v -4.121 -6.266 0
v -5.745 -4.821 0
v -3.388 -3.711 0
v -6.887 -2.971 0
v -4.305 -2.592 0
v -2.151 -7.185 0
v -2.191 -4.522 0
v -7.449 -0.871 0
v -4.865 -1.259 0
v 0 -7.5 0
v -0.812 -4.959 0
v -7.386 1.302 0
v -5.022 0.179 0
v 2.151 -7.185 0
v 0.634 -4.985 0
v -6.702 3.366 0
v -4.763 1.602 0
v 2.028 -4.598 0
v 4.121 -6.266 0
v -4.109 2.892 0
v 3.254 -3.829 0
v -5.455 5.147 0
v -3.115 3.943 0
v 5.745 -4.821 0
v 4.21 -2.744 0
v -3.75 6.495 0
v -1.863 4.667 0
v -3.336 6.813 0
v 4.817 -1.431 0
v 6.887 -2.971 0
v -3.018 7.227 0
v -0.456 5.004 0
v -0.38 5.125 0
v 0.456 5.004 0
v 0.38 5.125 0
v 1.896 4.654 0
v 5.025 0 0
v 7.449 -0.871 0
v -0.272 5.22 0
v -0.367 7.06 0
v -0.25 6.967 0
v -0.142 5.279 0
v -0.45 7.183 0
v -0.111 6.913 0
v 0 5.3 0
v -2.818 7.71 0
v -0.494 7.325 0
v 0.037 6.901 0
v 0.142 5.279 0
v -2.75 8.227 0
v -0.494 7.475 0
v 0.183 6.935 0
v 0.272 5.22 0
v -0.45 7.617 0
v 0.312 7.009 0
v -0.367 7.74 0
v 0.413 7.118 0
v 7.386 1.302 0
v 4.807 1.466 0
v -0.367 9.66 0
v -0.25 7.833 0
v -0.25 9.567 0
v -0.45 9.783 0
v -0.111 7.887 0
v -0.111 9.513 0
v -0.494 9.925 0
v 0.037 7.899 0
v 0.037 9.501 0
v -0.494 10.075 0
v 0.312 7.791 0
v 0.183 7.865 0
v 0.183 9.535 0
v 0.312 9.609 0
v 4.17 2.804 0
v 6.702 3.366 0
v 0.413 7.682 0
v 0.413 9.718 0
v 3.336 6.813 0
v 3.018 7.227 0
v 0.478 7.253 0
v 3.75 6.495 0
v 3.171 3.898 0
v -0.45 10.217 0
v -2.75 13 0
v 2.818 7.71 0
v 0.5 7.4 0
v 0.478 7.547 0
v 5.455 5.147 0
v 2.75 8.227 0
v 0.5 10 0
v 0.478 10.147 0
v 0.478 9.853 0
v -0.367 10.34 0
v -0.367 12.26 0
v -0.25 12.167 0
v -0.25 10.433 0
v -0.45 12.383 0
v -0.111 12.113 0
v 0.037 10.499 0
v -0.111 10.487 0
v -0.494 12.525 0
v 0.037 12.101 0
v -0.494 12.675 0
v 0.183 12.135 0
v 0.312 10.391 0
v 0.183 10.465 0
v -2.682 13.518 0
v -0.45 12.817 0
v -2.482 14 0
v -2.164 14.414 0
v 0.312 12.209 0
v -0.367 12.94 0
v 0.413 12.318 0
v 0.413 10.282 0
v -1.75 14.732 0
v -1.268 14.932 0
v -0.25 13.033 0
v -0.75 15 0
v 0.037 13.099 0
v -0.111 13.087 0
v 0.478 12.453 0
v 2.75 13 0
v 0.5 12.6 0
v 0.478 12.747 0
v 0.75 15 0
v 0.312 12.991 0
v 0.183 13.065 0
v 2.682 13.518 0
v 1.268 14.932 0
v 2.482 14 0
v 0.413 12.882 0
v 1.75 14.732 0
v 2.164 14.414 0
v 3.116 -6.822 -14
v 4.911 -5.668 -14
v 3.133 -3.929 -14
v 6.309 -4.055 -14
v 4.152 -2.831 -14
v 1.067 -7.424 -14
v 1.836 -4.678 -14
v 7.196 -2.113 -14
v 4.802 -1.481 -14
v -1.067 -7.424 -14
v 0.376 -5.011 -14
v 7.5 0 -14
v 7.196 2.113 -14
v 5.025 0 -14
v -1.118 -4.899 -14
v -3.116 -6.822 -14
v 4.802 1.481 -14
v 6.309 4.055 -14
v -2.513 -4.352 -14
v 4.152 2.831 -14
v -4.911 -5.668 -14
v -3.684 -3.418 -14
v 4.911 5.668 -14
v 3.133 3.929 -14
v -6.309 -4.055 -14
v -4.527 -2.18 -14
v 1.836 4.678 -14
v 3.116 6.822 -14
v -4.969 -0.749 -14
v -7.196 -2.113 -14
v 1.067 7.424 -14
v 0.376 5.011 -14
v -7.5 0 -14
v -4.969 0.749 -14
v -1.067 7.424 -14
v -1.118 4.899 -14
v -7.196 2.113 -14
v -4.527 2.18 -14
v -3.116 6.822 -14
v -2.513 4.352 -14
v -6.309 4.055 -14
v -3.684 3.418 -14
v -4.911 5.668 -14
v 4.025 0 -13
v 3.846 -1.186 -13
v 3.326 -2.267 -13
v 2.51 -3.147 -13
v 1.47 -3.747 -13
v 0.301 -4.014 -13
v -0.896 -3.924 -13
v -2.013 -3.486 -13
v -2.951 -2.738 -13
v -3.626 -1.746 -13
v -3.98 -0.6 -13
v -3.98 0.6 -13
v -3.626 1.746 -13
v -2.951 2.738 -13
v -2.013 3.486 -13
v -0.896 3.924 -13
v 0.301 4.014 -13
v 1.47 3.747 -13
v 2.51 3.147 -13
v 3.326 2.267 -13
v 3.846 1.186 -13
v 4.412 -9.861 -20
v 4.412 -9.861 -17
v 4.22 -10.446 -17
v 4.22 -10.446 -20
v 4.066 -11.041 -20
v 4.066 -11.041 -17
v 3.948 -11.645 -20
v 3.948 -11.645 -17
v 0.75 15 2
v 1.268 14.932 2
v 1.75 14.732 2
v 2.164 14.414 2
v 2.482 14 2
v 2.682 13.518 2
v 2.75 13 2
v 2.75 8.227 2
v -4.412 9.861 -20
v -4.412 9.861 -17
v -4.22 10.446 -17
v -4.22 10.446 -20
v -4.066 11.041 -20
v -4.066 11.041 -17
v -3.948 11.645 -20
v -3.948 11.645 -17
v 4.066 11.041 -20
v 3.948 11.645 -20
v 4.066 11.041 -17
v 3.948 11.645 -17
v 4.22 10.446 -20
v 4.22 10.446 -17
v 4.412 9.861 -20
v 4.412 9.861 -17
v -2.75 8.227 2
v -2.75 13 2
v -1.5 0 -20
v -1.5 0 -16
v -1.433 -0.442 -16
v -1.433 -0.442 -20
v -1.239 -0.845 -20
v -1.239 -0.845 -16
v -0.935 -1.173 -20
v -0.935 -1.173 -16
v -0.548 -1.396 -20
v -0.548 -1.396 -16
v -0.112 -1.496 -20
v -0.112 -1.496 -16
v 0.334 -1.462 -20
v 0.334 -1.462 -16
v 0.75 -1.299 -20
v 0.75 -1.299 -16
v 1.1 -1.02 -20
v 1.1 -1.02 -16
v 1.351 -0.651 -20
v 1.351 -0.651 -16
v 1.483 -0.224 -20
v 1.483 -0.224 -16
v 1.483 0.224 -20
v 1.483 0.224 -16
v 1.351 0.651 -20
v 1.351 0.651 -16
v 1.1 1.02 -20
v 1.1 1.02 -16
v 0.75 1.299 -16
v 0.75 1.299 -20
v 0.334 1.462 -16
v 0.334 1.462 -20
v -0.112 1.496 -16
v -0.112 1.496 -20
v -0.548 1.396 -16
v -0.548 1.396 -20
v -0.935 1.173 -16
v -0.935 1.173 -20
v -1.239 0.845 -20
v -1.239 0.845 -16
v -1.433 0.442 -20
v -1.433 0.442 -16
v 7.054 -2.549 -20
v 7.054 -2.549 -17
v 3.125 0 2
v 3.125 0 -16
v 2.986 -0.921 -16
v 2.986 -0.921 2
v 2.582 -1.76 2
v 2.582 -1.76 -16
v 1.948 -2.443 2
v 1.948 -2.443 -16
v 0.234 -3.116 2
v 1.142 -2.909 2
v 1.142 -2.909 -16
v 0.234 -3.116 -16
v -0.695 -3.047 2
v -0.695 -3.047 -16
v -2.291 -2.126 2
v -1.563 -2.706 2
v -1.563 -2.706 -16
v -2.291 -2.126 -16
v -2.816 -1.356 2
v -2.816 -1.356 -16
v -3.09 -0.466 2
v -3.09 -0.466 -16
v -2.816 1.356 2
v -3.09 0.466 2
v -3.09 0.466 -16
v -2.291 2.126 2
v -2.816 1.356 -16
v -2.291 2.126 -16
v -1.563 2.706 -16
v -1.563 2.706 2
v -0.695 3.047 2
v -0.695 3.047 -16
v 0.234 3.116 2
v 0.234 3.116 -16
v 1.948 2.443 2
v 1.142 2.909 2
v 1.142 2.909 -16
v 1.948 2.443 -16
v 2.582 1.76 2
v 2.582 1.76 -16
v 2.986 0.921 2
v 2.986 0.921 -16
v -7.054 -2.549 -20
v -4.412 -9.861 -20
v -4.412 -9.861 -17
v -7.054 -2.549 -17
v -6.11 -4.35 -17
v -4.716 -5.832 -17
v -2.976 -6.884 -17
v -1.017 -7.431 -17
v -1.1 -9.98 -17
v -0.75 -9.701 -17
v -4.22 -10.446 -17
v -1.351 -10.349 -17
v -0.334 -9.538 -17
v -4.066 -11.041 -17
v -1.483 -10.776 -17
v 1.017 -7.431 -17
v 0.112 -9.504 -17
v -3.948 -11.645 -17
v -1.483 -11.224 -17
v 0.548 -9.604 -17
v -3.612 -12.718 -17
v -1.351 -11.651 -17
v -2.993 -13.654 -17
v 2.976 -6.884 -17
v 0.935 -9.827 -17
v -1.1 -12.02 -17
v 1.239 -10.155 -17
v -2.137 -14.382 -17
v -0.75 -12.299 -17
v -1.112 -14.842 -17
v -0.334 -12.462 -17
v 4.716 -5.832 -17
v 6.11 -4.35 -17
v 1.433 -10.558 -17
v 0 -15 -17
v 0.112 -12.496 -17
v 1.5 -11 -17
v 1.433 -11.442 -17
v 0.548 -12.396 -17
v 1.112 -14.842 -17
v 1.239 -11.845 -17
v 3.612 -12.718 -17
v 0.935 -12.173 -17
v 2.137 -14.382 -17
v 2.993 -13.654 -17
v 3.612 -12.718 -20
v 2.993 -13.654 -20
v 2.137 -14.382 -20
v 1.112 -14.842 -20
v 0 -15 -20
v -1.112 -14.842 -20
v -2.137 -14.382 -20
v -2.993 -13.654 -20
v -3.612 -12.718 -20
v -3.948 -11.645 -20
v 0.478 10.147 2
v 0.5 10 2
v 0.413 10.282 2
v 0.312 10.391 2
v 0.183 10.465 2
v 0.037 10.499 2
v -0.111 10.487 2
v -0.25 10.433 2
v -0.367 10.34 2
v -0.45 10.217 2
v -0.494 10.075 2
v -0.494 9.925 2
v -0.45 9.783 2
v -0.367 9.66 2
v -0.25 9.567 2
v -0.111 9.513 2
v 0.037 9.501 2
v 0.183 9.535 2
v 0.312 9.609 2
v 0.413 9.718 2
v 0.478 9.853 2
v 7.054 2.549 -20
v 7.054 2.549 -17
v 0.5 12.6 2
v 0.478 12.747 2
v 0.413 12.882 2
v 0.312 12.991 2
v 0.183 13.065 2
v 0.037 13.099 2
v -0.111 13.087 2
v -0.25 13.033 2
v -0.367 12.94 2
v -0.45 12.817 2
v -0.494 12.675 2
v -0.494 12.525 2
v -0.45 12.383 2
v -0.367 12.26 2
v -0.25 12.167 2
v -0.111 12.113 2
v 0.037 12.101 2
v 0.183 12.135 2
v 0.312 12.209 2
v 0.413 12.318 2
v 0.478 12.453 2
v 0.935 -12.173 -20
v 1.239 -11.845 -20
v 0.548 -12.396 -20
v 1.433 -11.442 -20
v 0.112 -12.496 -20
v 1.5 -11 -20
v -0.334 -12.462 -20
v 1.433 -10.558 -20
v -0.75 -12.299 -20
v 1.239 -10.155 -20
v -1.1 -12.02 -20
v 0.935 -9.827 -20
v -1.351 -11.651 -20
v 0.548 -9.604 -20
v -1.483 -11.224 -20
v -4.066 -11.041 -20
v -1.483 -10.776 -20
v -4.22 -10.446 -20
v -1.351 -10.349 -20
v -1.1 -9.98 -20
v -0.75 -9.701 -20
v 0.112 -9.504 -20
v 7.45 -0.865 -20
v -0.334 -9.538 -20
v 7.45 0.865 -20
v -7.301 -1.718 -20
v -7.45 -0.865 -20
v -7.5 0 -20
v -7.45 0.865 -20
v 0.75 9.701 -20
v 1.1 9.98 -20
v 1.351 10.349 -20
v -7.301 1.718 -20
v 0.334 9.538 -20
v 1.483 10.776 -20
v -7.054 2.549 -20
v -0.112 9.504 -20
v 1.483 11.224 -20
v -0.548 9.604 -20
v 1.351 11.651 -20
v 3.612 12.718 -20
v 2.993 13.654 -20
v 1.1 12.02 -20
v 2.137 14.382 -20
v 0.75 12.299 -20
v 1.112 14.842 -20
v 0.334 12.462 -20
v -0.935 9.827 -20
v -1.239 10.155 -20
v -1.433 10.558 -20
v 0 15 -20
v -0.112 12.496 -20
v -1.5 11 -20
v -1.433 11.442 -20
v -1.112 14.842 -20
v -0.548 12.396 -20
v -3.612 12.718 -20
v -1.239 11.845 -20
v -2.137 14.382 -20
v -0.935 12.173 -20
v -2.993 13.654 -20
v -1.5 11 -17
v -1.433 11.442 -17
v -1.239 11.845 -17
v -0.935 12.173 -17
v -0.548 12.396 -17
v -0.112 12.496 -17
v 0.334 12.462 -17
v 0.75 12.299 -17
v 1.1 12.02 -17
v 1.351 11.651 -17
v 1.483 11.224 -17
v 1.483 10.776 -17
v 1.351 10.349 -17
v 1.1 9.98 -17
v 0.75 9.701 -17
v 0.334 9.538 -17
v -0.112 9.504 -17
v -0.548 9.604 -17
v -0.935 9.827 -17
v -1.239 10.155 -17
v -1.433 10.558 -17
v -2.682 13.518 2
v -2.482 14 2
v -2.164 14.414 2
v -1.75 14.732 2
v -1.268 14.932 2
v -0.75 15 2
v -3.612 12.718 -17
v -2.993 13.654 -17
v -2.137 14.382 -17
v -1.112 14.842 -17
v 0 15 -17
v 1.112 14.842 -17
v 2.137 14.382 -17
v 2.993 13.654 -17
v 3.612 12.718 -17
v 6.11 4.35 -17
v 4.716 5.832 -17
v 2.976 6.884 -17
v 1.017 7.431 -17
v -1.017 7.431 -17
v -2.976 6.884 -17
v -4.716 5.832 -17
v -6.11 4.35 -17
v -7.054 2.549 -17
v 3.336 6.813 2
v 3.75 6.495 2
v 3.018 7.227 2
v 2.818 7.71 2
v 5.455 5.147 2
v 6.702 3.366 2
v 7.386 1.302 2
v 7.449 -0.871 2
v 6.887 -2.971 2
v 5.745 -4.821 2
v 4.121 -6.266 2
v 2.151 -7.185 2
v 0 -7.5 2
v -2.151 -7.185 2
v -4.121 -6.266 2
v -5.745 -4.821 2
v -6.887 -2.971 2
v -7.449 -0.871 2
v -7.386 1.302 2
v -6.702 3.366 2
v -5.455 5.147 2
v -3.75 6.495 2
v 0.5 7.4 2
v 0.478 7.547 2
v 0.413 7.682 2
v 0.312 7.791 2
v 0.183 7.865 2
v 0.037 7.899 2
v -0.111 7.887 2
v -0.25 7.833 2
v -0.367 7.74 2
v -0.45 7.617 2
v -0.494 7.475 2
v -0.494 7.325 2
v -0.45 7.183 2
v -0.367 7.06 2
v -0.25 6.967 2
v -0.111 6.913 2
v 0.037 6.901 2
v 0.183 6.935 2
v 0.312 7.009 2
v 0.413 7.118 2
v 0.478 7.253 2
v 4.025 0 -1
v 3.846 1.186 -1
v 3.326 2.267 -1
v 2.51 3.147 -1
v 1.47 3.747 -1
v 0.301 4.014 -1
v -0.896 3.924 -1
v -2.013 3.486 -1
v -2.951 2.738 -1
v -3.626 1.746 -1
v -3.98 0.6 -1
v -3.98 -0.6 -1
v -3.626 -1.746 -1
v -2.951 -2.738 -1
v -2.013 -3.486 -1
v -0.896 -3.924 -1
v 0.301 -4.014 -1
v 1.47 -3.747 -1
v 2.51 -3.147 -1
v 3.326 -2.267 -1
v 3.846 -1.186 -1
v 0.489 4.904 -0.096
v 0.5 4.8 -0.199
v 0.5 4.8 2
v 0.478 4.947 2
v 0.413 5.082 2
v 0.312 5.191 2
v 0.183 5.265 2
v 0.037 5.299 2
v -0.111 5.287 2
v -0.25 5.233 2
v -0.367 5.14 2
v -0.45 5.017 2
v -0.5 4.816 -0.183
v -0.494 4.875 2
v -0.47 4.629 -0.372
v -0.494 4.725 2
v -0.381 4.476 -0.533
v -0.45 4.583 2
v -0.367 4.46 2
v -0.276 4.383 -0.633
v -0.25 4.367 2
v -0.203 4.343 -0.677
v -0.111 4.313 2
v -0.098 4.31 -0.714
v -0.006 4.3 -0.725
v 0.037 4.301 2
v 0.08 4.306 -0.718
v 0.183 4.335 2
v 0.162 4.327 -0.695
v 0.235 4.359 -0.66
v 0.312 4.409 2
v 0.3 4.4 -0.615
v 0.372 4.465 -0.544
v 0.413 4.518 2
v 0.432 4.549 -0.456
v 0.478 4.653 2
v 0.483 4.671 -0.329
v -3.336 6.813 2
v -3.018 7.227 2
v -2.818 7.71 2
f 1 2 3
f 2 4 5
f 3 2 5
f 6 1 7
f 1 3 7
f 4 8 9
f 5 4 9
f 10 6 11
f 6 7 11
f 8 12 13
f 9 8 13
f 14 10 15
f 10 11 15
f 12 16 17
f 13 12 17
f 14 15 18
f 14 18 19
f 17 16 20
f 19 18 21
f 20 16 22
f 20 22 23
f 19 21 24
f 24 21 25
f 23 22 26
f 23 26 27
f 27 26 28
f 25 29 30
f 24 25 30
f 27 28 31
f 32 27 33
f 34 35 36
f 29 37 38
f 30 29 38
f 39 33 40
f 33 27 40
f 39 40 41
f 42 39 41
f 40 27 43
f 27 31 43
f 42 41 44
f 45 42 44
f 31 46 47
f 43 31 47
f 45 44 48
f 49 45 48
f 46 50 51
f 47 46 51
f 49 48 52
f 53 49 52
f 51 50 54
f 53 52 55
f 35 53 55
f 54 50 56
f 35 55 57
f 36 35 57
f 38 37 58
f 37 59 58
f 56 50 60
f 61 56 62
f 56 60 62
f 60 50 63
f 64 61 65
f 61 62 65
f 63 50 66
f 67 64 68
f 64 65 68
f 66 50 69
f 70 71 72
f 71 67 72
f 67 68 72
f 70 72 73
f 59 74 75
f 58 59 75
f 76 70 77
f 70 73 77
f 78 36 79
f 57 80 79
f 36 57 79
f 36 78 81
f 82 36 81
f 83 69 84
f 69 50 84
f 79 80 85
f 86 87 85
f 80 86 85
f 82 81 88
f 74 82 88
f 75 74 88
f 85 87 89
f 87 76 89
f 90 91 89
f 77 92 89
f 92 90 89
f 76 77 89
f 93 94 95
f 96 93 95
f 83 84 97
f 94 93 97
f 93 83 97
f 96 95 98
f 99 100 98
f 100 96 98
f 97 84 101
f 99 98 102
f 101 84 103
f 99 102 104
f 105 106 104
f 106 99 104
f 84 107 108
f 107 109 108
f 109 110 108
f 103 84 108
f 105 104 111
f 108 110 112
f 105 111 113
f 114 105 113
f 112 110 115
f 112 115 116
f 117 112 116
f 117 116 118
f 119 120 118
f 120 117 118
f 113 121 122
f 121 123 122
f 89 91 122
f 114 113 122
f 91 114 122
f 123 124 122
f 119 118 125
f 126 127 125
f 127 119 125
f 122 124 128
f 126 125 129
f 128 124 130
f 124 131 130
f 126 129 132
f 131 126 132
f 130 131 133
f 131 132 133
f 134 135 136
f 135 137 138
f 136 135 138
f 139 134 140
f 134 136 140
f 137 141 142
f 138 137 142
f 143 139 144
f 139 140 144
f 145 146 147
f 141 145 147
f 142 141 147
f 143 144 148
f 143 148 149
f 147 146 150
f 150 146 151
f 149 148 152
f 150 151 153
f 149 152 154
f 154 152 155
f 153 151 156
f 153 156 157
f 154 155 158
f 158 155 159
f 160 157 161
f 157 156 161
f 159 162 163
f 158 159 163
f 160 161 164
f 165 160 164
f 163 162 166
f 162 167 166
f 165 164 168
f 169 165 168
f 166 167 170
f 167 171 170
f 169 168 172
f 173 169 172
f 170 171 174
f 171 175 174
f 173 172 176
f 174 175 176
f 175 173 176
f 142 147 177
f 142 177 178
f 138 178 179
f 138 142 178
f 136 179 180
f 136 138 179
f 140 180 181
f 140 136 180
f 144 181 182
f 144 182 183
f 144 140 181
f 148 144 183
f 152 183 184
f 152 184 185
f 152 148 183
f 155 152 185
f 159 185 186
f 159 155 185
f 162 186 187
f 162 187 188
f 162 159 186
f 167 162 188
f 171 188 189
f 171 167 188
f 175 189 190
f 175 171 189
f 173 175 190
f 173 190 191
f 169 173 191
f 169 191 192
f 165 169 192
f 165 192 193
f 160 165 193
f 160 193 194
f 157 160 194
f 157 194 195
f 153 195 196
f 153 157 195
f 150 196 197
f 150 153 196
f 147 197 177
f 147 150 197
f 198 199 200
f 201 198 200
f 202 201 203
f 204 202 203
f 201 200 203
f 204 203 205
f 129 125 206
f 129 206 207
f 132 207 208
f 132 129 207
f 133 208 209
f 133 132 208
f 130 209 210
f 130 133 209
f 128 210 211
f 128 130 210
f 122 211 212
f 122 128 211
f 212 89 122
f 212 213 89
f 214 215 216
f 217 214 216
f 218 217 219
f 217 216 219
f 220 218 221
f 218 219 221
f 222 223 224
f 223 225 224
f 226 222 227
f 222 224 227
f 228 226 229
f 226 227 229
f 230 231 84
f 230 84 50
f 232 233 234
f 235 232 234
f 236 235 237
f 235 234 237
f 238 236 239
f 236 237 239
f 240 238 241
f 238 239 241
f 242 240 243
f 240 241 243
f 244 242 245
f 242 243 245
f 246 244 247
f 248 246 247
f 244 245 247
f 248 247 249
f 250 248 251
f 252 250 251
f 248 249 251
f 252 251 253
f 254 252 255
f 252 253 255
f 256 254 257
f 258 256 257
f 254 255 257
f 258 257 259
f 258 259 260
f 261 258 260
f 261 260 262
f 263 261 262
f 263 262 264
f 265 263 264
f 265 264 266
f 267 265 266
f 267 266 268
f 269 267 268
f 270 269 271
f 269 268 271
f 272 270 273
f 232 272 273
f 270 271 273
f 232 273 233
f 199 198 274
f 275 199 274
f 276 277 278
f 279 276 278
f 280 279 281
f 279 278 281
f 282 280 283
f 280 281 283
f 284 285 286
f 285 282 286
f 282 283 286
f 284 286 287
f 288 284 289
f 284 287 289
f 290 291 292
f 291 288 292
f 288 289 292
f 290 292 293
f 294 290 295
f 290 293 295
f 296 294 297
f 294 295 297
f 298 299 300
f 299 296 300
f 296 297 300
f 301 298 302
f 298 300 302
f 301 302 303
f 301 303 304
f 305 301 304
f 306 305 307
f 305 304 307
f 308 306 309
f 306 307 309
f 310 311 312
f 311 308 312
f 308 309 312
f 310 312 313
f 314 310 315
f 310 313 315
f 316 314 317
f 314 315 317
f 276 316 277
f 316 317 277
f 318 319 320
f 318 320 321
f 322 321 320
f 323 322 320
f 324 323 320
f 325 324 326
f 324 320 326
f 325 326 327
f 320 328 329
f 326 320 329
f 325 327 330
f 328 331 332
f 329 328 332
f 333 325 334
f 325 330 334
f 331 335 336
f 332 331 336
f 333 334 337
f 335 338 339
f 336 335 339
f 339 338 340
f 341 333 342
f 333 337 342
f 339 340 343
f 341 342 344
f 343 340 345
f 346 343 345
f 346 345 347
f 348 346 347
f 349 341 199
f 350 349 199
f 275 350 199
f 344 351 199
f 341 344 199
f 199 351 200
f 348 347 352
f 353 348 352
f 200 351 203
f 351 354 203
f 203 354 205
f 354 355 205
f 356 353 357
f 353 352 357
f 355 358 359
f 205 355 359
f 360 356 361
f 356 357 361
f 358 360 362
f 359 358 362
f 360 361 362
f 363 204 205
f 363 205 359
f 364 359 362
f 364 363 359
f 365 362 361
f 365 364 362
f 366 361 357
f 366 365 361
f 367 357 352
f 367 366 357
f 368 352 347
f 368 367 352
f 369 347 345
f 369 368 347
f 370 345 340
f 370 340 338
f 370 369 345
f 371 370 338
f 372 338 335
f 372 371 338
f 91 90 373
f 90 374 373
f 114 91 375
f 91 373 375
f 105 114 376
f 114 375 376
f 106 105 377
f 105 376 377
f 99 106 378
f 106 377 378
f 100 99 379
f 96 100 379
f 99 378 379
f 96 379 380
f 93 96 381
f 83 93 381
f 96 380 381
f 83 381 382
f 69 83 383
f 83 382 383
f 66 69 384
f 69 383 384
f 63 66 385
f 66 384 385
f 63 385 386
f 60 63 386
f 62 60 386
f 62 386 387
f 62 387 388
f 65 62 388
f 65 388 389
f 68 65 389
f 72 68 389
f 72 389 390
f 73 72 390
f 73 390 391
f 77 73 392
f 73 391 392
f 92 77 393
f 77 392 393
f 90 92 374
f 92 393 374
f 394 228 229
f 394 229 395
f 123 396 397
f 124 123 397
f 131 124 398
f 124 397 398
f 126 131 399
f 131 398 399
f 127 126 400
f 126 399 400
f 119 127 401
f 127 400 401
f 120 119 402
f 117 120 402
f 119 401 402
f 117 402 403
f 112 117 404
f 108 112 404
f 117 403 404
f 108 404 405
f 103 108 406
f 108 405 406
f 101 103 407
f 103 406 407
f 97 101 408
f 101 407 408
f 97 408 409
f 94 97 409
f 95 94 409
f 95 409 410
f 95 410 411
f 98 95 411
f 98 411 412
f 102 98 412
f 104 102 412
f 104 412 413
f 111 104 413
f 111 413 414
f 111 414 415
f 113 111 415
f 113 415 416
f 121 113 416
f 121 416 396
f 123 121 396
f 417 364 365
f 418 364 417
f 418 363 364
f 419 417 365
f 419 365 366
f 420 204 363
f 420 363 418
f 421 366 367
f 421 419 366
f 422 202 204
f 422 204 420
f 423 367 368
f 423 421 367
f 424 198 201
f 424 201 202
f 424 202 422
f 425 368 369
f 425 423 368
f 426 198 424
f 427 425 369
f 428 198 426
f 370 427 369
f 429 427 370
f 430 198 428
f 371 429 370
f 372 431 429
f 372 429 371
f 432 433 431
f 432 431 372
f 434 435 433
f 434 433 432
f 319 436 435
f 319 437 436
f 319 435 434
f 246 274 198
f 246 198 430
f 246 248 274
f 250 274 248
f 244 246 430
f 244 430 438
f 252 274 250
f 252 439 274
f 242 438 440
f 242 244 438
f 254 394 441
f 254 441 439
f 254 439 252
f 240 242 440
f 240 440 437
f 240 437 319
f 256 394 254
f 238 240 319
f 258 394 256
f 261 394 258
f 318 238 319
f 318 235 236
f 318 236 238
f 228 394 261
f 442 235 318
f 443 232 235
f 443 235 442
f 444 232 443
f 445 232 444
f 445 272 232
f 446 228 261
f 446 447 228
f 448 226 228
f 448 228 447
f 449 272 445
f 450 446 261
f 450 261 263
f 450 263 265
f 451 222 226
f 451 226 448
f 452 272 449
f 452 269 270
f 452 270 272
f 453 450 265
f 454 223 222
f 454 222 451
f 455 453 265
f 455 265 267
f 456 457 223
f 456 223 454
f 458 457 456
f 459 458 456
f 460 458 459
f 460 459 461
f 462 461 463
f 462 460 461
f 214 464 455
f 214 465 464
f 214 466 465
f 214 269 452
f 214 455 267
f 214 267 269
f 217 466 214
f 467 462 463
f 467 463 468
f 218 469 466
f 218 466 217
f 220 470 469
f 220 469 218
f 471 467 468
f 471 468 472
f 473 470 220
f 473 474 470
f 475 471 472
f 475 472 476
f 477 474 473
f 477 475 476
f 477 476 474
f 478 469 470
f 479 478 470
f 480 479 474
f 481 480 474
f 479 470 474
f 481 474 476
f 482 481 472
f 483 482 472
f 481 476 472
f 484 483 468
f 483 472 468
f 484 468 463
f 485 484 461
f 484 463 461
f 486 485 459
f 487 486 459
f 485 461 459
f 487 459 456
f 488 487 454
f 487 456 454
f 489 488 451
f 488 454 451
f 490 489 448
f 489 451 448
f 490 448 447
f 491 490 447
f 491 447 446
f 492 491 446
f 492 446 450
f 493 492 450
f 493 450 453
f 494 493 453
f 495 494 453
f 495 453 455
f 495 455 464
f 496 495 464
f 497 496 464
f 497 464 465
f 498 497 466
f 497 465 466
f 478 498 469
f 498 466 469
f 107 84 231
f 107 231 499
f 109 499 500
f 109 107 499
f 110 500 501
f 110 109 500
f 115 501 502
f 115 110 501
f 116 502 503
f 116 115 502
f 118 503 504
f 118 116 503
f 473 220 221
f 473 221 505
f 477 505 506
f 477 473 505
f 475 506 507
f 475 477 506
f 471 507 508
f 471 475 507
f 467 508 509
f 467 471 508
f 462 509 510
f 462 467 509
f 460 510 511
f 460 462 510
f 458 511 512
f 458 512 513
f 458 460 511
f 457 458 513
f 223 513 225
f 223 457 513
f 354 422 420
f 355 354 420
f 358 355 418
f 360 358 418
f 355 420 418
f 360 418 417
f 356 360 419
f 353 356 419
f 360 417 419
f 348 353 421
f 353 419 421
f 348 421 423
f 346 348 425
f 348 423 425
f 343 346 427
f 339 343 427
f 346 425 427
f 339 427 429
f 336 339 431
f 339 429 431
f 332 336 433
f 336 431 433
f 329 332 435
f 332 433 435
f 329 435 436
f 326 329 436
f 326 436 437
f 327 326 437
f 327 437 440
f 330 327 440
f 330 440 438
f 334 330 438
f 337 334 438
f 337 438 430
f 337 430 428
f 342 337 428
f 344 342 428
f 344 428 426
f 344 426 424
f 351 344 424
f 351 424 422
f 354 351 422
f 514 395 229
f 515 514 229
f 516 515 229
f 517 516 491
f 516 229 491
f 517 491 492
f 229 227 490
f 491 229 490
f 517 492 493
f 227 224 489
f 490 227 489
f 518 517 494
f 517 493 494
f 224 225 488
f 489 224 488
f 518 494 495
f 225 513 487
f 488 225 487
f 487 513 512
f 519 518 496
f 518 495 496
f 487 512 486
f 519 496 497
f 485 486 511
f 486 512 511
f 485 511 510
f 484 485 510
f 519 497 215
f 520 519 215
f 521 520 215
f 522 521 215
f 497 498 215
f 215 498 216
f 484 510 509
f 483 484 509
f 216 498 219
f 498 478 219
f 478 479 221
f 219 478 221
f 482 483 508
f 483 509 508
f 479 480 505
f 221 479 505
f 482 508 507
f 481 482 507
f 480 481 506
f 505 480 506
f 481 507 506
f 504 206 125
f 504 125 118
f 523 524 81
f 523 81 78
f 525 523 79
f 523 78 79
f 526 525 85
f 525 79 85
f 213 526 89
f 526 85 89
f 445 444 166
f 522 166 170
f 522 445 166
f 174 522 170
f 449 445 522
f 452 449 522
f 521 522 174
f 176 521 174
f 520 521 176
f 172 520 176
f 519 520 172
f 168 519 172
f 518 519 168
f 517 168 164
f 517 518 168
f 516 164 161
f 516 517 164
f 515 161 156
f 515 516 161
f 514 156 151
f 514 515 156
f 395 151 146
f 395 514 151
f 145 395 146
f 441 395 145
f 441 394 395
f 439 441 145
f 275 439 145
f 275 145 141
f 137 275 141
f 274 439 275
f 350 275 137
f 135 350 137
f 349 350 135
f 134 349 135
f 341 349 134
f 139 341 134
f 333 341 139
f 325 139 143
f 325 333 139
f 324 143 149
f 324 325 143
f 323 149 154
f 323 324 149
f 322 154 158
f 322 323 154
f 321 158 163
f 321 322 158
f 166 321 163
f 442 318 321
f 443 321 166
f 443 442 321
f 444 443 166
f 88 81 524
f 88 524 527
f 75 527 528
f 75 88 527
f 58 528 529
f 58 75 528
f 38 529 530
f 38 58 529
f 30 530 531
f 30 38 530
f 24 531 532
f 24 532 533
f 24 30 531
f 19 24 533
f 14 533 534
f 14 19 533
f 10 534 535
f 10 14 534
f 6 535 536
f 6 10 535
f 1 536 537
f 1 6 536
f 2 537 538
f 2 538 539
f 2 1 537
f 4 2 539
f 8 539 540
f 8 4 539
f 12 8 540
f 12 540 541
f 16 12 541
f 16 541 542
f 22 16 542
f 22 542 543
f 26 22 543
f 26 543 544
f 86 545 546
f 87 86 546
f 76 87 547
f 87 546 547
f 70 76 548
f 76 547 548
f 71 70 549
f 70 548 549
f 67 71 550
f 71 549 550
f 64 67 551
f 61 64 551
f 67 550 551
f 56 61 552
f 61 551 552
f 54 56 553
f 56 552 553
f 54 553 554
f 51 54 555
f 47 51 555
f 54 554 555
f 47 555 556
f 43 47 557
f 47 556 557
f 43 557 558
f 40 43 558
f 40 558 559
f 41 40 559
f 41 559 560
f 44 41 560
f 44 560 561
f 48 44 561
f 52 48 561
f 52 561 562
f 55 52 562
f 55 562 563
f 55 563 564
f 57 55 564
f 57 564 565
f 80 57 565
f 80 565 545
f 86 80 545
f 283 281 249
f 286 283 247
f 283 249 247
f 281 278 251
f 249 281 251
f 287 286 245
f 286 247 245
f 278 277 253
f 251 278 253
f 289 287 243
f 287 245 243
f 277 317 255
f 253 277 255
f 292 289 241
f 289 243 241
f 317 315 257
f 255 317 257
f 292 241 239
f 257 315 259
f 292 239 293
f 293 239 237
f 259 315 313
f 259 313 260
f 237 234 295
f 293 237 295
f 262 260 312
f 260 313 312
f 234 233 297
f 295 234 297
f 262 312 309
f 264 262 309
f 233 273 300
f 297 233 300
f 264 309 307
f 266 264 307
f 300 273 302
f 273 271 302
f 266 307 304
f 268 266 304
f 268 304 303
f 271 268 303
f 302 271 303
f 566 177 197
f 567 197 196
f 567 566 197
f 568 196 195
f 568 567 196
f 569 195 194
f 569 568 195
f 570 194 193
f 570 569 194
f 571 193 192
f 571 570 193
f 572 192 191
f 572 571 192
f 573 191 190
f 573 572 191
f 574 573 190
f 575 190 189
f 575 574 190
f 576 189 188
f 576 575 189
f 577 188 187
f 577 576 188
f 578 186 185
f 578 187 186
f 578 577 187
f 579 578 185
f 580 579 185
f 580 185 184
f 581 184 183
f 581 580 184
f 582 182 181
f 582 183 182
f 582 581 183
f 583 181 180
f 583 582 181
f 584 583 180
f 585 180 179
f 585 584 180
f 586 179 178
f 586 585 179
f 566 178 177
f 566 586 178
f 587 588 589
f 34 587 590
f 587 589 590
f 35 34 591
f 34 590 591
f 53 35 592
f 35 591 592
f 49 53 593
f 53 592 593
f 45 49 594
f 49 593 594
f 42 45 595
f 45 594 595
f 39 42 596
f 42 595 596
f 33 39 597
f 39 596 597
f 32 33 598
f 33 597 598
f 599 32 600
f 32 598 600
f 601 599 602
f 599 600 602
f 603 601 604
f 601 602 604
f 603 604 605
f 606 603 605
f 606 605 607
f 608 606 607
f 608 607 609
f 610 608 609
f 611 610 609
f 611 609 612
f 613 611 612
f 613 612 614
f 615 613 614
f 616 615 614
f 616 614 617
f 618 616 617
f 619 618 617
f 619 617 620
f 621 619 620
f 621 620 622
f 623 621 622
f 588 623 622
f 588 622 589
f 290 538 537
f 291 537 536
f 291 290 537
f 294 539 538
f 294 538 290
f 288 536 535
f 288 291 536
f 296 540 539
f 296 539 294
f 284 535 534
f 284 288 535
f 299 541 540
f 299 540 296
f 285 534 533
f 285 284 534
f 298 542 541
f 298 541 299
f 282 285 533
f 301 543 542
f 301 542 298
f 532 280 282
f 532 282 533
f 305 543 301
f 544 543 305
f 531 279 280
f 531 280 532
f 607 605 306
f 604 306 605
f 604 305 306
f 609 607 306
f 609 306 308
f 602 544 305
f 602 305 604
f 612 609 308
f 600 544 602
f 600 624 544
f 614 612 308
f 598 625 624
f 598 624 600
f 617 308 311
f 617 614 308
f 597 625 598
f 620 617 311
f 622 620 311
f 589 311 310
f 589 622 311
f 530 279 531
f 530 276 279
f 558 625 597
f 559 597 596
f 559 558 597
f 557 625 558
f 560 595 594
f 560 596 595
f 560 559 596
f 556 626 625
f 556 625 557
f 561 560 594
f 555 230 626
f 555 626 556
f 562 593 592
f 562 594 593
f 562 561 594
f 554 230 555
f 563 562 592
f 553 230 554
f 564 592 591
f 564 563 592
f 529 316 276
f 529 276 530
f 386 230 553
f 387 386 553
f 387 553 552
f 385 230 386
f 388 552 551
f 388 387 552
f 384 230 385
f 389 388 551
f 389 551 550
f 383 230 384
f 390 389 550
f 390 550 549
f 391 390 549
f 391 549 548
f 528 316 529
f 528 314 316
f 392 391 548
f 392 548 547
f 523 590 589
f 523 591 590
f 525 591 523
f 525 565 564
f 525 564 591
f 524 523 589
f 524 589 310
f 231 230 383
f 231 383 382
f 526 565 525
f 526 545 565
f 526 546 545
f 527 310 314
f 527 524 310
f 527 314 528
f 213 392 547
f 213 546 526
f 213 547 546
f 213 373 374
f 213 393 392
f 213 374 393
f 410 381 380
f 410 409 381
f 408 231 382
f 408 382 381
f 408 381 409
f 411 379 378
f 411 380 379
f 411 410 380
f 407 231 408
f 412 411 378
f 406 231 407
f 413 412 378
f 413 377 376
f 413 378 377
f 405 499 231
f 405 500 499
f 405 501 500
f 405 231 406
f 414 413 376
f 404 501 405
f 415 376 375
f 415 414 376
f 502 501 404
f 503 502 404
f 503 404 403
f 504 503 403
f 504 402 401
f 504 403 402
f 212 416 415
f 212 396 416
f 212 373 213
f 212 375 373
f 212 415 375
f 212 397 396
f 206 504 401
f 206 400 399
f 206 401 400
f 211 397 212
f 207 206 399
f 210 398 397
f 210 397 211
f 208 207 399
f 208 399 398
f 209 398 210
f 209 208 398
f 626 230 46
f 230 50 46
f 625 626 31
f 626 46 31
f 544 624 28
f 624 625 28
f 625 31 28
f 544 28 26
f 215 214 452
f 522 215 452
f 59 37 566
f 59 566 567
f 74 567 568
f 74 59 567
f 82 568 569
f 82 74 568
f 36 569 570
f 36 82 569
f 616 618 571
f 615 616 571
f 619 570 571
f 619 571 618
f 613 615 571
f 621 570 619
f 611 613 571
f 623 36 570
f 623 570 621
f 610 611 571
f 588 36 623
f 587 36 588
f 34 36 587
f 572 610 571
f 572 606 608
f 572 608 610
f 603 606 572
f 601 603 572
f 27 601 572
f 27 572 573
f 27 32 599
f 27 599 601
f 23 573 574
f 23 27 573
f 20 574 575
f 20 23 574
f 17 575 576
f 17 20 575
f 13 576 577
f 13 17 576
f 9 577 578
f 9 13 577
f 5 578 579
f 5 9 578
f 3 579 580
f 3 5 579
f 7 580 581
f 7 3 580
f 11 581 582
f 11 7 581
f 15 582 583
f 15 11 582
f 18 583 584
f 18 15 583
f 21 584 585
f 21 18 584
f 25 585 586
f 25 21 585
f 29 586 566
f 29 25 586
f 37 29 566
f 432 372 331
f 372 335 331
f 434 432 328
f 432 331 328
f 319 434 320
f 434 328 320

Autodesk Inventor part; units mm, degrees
ref_plane "YZ Plane" through (0, 0, 0) normal (1, 0, 0) x (0, 1, 0)
ref_plane "XZ Plane" through (0, 0, 0) normal (0, 1, 0) x (-1, 0, 0)
ref_plane "XY Plane" through (0, 0, 0) normal (0, 0, 1) x (1, 0, 0)
sketch "Sketch1" plane through (0, 0, 0) normal (0, 0, 1) x (1, 0, 0)
  circle A0 centre (0, 0) radius 3.125
  circle A1 centre (0, 0) radius 4.025
  circle A2 centre (0, 0) radius 7.5
  dimension "d0" = 6.25
  dimension "d1" = 0.9
  dimension "d2" = 15
extrude "Extrusion1" add sketch "Sketch1" along normal blind 2 contours A1 | A2
extrude "Extrusion2" add sketch "Sketch1" against normal blind 16 contours A1
sketch "Sketch2" plane through (0, 0, -16) normal (0, 0, -1) x (-1, 0, 0)
  circle A0 centre (0, 0) radius 4.025 projected
  circle A1 centre (0, 0) radius 7.5 projected
  circle A2 centre (0, 0) radius 3.125 projected
  circle A3 centre (0, 0) radius 1.5
  dimension "d9" = 3
extrude "Extrusion3" add sketch "Sketch2" along normal blind 4 contours A0 | A1 | A2
sketch "Sketch3" plane through (0, 0, -20) normal (0, 0, -1) x (-1, 0, 0)
  circle A0 centre (0, 0) radius 1.5 projected
  circle A1 centre (0, 0) radius 7.5 projected
  circle A2 centre (0, 11) radius 1.5
  circle A3 centre (0, 11) radius 4
  circle A4 centre (0, 0) radius 7.5 projected
  line L0 (4, 11) -> (7.0537, 2.5487)
  line L1 (-4, 11) -> (-7.0537, 2.5487)
  dimension "d10" = 3
  dimension "d11" = 11
  dimension "d12" = 8
  dimension "d41" = 0
extrude "Extrusion4" add sketch "Sketch3" against normal blind 3
pattern_circular "Circular Pattern1" count 2 over 360 about axis through (0, 0, -16) along (0, 0, -1) of "Extrusion4"
extrude "Extrusion5" add sketch "Sketch2" against normal blind 2 contours A1
fillet "Fillet1" radius 10 4 edges at (-4, 11, -18.5) (4, 11, -18.5) (-4, -11, -18.5) (4, -11, -18.5)
chamfer "Chamfer1" distance 1 angle 45 2 edges at (-4.025, 0, -14) (-4.025, 0, 0)
sketch "Sketch4" plane through (0, 0, 2) normal (0, 0, 1) x (1, 0, 0)
  circle A0 centre (0, 0) radius 3.125 projected
  circle A1 centre (0, 0) radius 7.5 projected
  circle A2 centre (0, 0) radius 7.5 projected
  line L0 (2.75, 6.9776) -> (2.75, 15)
  line L1 (2.75, 15) -> (-2.75, 15)
  line L2 (-2.75, 15) -> (-2.75, 6.9776)
  circle A3 centre (0, 4.8) radius 0.5
  circle A4 centre (0, 7.4) radius 0.5
  circle A5 centre (0, 10) radius 0.5
  circle A6 centre (0, 12.6) radius 0.5
  circle A7 centre (0, 0) radius 4.025 projected
  dimension "d24" = 2.75
  dimension "d25" = 2.75
  dimension "d26" = 7.5
  dimension "d27" = 1
  dimension "d28" = 4.8
  dimension "d31" = 2.6
extrude "Extrusion6" add sketch "Sketch4" against normal blind 2 contours A1 A4 L2 L1 L0 | A1 A4 picked at (0, 7.6321)
extrude "Extrusion7" cut sketch "Sketch4" against normal blind 3 contours A4 A1 | A1 A4 | A3 picked at (-0.014, 7.2994) picked at (0, 7.6321)
fillet "Fillet2" radius 2 4 edges at (2.75, 6.9776, 1) (-2.75, 6.9776, 1) (-2.75, 15, 1) (2.75, 15, 1)
equation "\"d25\" = d24"
properties part number "3DP_ABS_Solenoid_Actuator_Body" material "ABS Plastic"
